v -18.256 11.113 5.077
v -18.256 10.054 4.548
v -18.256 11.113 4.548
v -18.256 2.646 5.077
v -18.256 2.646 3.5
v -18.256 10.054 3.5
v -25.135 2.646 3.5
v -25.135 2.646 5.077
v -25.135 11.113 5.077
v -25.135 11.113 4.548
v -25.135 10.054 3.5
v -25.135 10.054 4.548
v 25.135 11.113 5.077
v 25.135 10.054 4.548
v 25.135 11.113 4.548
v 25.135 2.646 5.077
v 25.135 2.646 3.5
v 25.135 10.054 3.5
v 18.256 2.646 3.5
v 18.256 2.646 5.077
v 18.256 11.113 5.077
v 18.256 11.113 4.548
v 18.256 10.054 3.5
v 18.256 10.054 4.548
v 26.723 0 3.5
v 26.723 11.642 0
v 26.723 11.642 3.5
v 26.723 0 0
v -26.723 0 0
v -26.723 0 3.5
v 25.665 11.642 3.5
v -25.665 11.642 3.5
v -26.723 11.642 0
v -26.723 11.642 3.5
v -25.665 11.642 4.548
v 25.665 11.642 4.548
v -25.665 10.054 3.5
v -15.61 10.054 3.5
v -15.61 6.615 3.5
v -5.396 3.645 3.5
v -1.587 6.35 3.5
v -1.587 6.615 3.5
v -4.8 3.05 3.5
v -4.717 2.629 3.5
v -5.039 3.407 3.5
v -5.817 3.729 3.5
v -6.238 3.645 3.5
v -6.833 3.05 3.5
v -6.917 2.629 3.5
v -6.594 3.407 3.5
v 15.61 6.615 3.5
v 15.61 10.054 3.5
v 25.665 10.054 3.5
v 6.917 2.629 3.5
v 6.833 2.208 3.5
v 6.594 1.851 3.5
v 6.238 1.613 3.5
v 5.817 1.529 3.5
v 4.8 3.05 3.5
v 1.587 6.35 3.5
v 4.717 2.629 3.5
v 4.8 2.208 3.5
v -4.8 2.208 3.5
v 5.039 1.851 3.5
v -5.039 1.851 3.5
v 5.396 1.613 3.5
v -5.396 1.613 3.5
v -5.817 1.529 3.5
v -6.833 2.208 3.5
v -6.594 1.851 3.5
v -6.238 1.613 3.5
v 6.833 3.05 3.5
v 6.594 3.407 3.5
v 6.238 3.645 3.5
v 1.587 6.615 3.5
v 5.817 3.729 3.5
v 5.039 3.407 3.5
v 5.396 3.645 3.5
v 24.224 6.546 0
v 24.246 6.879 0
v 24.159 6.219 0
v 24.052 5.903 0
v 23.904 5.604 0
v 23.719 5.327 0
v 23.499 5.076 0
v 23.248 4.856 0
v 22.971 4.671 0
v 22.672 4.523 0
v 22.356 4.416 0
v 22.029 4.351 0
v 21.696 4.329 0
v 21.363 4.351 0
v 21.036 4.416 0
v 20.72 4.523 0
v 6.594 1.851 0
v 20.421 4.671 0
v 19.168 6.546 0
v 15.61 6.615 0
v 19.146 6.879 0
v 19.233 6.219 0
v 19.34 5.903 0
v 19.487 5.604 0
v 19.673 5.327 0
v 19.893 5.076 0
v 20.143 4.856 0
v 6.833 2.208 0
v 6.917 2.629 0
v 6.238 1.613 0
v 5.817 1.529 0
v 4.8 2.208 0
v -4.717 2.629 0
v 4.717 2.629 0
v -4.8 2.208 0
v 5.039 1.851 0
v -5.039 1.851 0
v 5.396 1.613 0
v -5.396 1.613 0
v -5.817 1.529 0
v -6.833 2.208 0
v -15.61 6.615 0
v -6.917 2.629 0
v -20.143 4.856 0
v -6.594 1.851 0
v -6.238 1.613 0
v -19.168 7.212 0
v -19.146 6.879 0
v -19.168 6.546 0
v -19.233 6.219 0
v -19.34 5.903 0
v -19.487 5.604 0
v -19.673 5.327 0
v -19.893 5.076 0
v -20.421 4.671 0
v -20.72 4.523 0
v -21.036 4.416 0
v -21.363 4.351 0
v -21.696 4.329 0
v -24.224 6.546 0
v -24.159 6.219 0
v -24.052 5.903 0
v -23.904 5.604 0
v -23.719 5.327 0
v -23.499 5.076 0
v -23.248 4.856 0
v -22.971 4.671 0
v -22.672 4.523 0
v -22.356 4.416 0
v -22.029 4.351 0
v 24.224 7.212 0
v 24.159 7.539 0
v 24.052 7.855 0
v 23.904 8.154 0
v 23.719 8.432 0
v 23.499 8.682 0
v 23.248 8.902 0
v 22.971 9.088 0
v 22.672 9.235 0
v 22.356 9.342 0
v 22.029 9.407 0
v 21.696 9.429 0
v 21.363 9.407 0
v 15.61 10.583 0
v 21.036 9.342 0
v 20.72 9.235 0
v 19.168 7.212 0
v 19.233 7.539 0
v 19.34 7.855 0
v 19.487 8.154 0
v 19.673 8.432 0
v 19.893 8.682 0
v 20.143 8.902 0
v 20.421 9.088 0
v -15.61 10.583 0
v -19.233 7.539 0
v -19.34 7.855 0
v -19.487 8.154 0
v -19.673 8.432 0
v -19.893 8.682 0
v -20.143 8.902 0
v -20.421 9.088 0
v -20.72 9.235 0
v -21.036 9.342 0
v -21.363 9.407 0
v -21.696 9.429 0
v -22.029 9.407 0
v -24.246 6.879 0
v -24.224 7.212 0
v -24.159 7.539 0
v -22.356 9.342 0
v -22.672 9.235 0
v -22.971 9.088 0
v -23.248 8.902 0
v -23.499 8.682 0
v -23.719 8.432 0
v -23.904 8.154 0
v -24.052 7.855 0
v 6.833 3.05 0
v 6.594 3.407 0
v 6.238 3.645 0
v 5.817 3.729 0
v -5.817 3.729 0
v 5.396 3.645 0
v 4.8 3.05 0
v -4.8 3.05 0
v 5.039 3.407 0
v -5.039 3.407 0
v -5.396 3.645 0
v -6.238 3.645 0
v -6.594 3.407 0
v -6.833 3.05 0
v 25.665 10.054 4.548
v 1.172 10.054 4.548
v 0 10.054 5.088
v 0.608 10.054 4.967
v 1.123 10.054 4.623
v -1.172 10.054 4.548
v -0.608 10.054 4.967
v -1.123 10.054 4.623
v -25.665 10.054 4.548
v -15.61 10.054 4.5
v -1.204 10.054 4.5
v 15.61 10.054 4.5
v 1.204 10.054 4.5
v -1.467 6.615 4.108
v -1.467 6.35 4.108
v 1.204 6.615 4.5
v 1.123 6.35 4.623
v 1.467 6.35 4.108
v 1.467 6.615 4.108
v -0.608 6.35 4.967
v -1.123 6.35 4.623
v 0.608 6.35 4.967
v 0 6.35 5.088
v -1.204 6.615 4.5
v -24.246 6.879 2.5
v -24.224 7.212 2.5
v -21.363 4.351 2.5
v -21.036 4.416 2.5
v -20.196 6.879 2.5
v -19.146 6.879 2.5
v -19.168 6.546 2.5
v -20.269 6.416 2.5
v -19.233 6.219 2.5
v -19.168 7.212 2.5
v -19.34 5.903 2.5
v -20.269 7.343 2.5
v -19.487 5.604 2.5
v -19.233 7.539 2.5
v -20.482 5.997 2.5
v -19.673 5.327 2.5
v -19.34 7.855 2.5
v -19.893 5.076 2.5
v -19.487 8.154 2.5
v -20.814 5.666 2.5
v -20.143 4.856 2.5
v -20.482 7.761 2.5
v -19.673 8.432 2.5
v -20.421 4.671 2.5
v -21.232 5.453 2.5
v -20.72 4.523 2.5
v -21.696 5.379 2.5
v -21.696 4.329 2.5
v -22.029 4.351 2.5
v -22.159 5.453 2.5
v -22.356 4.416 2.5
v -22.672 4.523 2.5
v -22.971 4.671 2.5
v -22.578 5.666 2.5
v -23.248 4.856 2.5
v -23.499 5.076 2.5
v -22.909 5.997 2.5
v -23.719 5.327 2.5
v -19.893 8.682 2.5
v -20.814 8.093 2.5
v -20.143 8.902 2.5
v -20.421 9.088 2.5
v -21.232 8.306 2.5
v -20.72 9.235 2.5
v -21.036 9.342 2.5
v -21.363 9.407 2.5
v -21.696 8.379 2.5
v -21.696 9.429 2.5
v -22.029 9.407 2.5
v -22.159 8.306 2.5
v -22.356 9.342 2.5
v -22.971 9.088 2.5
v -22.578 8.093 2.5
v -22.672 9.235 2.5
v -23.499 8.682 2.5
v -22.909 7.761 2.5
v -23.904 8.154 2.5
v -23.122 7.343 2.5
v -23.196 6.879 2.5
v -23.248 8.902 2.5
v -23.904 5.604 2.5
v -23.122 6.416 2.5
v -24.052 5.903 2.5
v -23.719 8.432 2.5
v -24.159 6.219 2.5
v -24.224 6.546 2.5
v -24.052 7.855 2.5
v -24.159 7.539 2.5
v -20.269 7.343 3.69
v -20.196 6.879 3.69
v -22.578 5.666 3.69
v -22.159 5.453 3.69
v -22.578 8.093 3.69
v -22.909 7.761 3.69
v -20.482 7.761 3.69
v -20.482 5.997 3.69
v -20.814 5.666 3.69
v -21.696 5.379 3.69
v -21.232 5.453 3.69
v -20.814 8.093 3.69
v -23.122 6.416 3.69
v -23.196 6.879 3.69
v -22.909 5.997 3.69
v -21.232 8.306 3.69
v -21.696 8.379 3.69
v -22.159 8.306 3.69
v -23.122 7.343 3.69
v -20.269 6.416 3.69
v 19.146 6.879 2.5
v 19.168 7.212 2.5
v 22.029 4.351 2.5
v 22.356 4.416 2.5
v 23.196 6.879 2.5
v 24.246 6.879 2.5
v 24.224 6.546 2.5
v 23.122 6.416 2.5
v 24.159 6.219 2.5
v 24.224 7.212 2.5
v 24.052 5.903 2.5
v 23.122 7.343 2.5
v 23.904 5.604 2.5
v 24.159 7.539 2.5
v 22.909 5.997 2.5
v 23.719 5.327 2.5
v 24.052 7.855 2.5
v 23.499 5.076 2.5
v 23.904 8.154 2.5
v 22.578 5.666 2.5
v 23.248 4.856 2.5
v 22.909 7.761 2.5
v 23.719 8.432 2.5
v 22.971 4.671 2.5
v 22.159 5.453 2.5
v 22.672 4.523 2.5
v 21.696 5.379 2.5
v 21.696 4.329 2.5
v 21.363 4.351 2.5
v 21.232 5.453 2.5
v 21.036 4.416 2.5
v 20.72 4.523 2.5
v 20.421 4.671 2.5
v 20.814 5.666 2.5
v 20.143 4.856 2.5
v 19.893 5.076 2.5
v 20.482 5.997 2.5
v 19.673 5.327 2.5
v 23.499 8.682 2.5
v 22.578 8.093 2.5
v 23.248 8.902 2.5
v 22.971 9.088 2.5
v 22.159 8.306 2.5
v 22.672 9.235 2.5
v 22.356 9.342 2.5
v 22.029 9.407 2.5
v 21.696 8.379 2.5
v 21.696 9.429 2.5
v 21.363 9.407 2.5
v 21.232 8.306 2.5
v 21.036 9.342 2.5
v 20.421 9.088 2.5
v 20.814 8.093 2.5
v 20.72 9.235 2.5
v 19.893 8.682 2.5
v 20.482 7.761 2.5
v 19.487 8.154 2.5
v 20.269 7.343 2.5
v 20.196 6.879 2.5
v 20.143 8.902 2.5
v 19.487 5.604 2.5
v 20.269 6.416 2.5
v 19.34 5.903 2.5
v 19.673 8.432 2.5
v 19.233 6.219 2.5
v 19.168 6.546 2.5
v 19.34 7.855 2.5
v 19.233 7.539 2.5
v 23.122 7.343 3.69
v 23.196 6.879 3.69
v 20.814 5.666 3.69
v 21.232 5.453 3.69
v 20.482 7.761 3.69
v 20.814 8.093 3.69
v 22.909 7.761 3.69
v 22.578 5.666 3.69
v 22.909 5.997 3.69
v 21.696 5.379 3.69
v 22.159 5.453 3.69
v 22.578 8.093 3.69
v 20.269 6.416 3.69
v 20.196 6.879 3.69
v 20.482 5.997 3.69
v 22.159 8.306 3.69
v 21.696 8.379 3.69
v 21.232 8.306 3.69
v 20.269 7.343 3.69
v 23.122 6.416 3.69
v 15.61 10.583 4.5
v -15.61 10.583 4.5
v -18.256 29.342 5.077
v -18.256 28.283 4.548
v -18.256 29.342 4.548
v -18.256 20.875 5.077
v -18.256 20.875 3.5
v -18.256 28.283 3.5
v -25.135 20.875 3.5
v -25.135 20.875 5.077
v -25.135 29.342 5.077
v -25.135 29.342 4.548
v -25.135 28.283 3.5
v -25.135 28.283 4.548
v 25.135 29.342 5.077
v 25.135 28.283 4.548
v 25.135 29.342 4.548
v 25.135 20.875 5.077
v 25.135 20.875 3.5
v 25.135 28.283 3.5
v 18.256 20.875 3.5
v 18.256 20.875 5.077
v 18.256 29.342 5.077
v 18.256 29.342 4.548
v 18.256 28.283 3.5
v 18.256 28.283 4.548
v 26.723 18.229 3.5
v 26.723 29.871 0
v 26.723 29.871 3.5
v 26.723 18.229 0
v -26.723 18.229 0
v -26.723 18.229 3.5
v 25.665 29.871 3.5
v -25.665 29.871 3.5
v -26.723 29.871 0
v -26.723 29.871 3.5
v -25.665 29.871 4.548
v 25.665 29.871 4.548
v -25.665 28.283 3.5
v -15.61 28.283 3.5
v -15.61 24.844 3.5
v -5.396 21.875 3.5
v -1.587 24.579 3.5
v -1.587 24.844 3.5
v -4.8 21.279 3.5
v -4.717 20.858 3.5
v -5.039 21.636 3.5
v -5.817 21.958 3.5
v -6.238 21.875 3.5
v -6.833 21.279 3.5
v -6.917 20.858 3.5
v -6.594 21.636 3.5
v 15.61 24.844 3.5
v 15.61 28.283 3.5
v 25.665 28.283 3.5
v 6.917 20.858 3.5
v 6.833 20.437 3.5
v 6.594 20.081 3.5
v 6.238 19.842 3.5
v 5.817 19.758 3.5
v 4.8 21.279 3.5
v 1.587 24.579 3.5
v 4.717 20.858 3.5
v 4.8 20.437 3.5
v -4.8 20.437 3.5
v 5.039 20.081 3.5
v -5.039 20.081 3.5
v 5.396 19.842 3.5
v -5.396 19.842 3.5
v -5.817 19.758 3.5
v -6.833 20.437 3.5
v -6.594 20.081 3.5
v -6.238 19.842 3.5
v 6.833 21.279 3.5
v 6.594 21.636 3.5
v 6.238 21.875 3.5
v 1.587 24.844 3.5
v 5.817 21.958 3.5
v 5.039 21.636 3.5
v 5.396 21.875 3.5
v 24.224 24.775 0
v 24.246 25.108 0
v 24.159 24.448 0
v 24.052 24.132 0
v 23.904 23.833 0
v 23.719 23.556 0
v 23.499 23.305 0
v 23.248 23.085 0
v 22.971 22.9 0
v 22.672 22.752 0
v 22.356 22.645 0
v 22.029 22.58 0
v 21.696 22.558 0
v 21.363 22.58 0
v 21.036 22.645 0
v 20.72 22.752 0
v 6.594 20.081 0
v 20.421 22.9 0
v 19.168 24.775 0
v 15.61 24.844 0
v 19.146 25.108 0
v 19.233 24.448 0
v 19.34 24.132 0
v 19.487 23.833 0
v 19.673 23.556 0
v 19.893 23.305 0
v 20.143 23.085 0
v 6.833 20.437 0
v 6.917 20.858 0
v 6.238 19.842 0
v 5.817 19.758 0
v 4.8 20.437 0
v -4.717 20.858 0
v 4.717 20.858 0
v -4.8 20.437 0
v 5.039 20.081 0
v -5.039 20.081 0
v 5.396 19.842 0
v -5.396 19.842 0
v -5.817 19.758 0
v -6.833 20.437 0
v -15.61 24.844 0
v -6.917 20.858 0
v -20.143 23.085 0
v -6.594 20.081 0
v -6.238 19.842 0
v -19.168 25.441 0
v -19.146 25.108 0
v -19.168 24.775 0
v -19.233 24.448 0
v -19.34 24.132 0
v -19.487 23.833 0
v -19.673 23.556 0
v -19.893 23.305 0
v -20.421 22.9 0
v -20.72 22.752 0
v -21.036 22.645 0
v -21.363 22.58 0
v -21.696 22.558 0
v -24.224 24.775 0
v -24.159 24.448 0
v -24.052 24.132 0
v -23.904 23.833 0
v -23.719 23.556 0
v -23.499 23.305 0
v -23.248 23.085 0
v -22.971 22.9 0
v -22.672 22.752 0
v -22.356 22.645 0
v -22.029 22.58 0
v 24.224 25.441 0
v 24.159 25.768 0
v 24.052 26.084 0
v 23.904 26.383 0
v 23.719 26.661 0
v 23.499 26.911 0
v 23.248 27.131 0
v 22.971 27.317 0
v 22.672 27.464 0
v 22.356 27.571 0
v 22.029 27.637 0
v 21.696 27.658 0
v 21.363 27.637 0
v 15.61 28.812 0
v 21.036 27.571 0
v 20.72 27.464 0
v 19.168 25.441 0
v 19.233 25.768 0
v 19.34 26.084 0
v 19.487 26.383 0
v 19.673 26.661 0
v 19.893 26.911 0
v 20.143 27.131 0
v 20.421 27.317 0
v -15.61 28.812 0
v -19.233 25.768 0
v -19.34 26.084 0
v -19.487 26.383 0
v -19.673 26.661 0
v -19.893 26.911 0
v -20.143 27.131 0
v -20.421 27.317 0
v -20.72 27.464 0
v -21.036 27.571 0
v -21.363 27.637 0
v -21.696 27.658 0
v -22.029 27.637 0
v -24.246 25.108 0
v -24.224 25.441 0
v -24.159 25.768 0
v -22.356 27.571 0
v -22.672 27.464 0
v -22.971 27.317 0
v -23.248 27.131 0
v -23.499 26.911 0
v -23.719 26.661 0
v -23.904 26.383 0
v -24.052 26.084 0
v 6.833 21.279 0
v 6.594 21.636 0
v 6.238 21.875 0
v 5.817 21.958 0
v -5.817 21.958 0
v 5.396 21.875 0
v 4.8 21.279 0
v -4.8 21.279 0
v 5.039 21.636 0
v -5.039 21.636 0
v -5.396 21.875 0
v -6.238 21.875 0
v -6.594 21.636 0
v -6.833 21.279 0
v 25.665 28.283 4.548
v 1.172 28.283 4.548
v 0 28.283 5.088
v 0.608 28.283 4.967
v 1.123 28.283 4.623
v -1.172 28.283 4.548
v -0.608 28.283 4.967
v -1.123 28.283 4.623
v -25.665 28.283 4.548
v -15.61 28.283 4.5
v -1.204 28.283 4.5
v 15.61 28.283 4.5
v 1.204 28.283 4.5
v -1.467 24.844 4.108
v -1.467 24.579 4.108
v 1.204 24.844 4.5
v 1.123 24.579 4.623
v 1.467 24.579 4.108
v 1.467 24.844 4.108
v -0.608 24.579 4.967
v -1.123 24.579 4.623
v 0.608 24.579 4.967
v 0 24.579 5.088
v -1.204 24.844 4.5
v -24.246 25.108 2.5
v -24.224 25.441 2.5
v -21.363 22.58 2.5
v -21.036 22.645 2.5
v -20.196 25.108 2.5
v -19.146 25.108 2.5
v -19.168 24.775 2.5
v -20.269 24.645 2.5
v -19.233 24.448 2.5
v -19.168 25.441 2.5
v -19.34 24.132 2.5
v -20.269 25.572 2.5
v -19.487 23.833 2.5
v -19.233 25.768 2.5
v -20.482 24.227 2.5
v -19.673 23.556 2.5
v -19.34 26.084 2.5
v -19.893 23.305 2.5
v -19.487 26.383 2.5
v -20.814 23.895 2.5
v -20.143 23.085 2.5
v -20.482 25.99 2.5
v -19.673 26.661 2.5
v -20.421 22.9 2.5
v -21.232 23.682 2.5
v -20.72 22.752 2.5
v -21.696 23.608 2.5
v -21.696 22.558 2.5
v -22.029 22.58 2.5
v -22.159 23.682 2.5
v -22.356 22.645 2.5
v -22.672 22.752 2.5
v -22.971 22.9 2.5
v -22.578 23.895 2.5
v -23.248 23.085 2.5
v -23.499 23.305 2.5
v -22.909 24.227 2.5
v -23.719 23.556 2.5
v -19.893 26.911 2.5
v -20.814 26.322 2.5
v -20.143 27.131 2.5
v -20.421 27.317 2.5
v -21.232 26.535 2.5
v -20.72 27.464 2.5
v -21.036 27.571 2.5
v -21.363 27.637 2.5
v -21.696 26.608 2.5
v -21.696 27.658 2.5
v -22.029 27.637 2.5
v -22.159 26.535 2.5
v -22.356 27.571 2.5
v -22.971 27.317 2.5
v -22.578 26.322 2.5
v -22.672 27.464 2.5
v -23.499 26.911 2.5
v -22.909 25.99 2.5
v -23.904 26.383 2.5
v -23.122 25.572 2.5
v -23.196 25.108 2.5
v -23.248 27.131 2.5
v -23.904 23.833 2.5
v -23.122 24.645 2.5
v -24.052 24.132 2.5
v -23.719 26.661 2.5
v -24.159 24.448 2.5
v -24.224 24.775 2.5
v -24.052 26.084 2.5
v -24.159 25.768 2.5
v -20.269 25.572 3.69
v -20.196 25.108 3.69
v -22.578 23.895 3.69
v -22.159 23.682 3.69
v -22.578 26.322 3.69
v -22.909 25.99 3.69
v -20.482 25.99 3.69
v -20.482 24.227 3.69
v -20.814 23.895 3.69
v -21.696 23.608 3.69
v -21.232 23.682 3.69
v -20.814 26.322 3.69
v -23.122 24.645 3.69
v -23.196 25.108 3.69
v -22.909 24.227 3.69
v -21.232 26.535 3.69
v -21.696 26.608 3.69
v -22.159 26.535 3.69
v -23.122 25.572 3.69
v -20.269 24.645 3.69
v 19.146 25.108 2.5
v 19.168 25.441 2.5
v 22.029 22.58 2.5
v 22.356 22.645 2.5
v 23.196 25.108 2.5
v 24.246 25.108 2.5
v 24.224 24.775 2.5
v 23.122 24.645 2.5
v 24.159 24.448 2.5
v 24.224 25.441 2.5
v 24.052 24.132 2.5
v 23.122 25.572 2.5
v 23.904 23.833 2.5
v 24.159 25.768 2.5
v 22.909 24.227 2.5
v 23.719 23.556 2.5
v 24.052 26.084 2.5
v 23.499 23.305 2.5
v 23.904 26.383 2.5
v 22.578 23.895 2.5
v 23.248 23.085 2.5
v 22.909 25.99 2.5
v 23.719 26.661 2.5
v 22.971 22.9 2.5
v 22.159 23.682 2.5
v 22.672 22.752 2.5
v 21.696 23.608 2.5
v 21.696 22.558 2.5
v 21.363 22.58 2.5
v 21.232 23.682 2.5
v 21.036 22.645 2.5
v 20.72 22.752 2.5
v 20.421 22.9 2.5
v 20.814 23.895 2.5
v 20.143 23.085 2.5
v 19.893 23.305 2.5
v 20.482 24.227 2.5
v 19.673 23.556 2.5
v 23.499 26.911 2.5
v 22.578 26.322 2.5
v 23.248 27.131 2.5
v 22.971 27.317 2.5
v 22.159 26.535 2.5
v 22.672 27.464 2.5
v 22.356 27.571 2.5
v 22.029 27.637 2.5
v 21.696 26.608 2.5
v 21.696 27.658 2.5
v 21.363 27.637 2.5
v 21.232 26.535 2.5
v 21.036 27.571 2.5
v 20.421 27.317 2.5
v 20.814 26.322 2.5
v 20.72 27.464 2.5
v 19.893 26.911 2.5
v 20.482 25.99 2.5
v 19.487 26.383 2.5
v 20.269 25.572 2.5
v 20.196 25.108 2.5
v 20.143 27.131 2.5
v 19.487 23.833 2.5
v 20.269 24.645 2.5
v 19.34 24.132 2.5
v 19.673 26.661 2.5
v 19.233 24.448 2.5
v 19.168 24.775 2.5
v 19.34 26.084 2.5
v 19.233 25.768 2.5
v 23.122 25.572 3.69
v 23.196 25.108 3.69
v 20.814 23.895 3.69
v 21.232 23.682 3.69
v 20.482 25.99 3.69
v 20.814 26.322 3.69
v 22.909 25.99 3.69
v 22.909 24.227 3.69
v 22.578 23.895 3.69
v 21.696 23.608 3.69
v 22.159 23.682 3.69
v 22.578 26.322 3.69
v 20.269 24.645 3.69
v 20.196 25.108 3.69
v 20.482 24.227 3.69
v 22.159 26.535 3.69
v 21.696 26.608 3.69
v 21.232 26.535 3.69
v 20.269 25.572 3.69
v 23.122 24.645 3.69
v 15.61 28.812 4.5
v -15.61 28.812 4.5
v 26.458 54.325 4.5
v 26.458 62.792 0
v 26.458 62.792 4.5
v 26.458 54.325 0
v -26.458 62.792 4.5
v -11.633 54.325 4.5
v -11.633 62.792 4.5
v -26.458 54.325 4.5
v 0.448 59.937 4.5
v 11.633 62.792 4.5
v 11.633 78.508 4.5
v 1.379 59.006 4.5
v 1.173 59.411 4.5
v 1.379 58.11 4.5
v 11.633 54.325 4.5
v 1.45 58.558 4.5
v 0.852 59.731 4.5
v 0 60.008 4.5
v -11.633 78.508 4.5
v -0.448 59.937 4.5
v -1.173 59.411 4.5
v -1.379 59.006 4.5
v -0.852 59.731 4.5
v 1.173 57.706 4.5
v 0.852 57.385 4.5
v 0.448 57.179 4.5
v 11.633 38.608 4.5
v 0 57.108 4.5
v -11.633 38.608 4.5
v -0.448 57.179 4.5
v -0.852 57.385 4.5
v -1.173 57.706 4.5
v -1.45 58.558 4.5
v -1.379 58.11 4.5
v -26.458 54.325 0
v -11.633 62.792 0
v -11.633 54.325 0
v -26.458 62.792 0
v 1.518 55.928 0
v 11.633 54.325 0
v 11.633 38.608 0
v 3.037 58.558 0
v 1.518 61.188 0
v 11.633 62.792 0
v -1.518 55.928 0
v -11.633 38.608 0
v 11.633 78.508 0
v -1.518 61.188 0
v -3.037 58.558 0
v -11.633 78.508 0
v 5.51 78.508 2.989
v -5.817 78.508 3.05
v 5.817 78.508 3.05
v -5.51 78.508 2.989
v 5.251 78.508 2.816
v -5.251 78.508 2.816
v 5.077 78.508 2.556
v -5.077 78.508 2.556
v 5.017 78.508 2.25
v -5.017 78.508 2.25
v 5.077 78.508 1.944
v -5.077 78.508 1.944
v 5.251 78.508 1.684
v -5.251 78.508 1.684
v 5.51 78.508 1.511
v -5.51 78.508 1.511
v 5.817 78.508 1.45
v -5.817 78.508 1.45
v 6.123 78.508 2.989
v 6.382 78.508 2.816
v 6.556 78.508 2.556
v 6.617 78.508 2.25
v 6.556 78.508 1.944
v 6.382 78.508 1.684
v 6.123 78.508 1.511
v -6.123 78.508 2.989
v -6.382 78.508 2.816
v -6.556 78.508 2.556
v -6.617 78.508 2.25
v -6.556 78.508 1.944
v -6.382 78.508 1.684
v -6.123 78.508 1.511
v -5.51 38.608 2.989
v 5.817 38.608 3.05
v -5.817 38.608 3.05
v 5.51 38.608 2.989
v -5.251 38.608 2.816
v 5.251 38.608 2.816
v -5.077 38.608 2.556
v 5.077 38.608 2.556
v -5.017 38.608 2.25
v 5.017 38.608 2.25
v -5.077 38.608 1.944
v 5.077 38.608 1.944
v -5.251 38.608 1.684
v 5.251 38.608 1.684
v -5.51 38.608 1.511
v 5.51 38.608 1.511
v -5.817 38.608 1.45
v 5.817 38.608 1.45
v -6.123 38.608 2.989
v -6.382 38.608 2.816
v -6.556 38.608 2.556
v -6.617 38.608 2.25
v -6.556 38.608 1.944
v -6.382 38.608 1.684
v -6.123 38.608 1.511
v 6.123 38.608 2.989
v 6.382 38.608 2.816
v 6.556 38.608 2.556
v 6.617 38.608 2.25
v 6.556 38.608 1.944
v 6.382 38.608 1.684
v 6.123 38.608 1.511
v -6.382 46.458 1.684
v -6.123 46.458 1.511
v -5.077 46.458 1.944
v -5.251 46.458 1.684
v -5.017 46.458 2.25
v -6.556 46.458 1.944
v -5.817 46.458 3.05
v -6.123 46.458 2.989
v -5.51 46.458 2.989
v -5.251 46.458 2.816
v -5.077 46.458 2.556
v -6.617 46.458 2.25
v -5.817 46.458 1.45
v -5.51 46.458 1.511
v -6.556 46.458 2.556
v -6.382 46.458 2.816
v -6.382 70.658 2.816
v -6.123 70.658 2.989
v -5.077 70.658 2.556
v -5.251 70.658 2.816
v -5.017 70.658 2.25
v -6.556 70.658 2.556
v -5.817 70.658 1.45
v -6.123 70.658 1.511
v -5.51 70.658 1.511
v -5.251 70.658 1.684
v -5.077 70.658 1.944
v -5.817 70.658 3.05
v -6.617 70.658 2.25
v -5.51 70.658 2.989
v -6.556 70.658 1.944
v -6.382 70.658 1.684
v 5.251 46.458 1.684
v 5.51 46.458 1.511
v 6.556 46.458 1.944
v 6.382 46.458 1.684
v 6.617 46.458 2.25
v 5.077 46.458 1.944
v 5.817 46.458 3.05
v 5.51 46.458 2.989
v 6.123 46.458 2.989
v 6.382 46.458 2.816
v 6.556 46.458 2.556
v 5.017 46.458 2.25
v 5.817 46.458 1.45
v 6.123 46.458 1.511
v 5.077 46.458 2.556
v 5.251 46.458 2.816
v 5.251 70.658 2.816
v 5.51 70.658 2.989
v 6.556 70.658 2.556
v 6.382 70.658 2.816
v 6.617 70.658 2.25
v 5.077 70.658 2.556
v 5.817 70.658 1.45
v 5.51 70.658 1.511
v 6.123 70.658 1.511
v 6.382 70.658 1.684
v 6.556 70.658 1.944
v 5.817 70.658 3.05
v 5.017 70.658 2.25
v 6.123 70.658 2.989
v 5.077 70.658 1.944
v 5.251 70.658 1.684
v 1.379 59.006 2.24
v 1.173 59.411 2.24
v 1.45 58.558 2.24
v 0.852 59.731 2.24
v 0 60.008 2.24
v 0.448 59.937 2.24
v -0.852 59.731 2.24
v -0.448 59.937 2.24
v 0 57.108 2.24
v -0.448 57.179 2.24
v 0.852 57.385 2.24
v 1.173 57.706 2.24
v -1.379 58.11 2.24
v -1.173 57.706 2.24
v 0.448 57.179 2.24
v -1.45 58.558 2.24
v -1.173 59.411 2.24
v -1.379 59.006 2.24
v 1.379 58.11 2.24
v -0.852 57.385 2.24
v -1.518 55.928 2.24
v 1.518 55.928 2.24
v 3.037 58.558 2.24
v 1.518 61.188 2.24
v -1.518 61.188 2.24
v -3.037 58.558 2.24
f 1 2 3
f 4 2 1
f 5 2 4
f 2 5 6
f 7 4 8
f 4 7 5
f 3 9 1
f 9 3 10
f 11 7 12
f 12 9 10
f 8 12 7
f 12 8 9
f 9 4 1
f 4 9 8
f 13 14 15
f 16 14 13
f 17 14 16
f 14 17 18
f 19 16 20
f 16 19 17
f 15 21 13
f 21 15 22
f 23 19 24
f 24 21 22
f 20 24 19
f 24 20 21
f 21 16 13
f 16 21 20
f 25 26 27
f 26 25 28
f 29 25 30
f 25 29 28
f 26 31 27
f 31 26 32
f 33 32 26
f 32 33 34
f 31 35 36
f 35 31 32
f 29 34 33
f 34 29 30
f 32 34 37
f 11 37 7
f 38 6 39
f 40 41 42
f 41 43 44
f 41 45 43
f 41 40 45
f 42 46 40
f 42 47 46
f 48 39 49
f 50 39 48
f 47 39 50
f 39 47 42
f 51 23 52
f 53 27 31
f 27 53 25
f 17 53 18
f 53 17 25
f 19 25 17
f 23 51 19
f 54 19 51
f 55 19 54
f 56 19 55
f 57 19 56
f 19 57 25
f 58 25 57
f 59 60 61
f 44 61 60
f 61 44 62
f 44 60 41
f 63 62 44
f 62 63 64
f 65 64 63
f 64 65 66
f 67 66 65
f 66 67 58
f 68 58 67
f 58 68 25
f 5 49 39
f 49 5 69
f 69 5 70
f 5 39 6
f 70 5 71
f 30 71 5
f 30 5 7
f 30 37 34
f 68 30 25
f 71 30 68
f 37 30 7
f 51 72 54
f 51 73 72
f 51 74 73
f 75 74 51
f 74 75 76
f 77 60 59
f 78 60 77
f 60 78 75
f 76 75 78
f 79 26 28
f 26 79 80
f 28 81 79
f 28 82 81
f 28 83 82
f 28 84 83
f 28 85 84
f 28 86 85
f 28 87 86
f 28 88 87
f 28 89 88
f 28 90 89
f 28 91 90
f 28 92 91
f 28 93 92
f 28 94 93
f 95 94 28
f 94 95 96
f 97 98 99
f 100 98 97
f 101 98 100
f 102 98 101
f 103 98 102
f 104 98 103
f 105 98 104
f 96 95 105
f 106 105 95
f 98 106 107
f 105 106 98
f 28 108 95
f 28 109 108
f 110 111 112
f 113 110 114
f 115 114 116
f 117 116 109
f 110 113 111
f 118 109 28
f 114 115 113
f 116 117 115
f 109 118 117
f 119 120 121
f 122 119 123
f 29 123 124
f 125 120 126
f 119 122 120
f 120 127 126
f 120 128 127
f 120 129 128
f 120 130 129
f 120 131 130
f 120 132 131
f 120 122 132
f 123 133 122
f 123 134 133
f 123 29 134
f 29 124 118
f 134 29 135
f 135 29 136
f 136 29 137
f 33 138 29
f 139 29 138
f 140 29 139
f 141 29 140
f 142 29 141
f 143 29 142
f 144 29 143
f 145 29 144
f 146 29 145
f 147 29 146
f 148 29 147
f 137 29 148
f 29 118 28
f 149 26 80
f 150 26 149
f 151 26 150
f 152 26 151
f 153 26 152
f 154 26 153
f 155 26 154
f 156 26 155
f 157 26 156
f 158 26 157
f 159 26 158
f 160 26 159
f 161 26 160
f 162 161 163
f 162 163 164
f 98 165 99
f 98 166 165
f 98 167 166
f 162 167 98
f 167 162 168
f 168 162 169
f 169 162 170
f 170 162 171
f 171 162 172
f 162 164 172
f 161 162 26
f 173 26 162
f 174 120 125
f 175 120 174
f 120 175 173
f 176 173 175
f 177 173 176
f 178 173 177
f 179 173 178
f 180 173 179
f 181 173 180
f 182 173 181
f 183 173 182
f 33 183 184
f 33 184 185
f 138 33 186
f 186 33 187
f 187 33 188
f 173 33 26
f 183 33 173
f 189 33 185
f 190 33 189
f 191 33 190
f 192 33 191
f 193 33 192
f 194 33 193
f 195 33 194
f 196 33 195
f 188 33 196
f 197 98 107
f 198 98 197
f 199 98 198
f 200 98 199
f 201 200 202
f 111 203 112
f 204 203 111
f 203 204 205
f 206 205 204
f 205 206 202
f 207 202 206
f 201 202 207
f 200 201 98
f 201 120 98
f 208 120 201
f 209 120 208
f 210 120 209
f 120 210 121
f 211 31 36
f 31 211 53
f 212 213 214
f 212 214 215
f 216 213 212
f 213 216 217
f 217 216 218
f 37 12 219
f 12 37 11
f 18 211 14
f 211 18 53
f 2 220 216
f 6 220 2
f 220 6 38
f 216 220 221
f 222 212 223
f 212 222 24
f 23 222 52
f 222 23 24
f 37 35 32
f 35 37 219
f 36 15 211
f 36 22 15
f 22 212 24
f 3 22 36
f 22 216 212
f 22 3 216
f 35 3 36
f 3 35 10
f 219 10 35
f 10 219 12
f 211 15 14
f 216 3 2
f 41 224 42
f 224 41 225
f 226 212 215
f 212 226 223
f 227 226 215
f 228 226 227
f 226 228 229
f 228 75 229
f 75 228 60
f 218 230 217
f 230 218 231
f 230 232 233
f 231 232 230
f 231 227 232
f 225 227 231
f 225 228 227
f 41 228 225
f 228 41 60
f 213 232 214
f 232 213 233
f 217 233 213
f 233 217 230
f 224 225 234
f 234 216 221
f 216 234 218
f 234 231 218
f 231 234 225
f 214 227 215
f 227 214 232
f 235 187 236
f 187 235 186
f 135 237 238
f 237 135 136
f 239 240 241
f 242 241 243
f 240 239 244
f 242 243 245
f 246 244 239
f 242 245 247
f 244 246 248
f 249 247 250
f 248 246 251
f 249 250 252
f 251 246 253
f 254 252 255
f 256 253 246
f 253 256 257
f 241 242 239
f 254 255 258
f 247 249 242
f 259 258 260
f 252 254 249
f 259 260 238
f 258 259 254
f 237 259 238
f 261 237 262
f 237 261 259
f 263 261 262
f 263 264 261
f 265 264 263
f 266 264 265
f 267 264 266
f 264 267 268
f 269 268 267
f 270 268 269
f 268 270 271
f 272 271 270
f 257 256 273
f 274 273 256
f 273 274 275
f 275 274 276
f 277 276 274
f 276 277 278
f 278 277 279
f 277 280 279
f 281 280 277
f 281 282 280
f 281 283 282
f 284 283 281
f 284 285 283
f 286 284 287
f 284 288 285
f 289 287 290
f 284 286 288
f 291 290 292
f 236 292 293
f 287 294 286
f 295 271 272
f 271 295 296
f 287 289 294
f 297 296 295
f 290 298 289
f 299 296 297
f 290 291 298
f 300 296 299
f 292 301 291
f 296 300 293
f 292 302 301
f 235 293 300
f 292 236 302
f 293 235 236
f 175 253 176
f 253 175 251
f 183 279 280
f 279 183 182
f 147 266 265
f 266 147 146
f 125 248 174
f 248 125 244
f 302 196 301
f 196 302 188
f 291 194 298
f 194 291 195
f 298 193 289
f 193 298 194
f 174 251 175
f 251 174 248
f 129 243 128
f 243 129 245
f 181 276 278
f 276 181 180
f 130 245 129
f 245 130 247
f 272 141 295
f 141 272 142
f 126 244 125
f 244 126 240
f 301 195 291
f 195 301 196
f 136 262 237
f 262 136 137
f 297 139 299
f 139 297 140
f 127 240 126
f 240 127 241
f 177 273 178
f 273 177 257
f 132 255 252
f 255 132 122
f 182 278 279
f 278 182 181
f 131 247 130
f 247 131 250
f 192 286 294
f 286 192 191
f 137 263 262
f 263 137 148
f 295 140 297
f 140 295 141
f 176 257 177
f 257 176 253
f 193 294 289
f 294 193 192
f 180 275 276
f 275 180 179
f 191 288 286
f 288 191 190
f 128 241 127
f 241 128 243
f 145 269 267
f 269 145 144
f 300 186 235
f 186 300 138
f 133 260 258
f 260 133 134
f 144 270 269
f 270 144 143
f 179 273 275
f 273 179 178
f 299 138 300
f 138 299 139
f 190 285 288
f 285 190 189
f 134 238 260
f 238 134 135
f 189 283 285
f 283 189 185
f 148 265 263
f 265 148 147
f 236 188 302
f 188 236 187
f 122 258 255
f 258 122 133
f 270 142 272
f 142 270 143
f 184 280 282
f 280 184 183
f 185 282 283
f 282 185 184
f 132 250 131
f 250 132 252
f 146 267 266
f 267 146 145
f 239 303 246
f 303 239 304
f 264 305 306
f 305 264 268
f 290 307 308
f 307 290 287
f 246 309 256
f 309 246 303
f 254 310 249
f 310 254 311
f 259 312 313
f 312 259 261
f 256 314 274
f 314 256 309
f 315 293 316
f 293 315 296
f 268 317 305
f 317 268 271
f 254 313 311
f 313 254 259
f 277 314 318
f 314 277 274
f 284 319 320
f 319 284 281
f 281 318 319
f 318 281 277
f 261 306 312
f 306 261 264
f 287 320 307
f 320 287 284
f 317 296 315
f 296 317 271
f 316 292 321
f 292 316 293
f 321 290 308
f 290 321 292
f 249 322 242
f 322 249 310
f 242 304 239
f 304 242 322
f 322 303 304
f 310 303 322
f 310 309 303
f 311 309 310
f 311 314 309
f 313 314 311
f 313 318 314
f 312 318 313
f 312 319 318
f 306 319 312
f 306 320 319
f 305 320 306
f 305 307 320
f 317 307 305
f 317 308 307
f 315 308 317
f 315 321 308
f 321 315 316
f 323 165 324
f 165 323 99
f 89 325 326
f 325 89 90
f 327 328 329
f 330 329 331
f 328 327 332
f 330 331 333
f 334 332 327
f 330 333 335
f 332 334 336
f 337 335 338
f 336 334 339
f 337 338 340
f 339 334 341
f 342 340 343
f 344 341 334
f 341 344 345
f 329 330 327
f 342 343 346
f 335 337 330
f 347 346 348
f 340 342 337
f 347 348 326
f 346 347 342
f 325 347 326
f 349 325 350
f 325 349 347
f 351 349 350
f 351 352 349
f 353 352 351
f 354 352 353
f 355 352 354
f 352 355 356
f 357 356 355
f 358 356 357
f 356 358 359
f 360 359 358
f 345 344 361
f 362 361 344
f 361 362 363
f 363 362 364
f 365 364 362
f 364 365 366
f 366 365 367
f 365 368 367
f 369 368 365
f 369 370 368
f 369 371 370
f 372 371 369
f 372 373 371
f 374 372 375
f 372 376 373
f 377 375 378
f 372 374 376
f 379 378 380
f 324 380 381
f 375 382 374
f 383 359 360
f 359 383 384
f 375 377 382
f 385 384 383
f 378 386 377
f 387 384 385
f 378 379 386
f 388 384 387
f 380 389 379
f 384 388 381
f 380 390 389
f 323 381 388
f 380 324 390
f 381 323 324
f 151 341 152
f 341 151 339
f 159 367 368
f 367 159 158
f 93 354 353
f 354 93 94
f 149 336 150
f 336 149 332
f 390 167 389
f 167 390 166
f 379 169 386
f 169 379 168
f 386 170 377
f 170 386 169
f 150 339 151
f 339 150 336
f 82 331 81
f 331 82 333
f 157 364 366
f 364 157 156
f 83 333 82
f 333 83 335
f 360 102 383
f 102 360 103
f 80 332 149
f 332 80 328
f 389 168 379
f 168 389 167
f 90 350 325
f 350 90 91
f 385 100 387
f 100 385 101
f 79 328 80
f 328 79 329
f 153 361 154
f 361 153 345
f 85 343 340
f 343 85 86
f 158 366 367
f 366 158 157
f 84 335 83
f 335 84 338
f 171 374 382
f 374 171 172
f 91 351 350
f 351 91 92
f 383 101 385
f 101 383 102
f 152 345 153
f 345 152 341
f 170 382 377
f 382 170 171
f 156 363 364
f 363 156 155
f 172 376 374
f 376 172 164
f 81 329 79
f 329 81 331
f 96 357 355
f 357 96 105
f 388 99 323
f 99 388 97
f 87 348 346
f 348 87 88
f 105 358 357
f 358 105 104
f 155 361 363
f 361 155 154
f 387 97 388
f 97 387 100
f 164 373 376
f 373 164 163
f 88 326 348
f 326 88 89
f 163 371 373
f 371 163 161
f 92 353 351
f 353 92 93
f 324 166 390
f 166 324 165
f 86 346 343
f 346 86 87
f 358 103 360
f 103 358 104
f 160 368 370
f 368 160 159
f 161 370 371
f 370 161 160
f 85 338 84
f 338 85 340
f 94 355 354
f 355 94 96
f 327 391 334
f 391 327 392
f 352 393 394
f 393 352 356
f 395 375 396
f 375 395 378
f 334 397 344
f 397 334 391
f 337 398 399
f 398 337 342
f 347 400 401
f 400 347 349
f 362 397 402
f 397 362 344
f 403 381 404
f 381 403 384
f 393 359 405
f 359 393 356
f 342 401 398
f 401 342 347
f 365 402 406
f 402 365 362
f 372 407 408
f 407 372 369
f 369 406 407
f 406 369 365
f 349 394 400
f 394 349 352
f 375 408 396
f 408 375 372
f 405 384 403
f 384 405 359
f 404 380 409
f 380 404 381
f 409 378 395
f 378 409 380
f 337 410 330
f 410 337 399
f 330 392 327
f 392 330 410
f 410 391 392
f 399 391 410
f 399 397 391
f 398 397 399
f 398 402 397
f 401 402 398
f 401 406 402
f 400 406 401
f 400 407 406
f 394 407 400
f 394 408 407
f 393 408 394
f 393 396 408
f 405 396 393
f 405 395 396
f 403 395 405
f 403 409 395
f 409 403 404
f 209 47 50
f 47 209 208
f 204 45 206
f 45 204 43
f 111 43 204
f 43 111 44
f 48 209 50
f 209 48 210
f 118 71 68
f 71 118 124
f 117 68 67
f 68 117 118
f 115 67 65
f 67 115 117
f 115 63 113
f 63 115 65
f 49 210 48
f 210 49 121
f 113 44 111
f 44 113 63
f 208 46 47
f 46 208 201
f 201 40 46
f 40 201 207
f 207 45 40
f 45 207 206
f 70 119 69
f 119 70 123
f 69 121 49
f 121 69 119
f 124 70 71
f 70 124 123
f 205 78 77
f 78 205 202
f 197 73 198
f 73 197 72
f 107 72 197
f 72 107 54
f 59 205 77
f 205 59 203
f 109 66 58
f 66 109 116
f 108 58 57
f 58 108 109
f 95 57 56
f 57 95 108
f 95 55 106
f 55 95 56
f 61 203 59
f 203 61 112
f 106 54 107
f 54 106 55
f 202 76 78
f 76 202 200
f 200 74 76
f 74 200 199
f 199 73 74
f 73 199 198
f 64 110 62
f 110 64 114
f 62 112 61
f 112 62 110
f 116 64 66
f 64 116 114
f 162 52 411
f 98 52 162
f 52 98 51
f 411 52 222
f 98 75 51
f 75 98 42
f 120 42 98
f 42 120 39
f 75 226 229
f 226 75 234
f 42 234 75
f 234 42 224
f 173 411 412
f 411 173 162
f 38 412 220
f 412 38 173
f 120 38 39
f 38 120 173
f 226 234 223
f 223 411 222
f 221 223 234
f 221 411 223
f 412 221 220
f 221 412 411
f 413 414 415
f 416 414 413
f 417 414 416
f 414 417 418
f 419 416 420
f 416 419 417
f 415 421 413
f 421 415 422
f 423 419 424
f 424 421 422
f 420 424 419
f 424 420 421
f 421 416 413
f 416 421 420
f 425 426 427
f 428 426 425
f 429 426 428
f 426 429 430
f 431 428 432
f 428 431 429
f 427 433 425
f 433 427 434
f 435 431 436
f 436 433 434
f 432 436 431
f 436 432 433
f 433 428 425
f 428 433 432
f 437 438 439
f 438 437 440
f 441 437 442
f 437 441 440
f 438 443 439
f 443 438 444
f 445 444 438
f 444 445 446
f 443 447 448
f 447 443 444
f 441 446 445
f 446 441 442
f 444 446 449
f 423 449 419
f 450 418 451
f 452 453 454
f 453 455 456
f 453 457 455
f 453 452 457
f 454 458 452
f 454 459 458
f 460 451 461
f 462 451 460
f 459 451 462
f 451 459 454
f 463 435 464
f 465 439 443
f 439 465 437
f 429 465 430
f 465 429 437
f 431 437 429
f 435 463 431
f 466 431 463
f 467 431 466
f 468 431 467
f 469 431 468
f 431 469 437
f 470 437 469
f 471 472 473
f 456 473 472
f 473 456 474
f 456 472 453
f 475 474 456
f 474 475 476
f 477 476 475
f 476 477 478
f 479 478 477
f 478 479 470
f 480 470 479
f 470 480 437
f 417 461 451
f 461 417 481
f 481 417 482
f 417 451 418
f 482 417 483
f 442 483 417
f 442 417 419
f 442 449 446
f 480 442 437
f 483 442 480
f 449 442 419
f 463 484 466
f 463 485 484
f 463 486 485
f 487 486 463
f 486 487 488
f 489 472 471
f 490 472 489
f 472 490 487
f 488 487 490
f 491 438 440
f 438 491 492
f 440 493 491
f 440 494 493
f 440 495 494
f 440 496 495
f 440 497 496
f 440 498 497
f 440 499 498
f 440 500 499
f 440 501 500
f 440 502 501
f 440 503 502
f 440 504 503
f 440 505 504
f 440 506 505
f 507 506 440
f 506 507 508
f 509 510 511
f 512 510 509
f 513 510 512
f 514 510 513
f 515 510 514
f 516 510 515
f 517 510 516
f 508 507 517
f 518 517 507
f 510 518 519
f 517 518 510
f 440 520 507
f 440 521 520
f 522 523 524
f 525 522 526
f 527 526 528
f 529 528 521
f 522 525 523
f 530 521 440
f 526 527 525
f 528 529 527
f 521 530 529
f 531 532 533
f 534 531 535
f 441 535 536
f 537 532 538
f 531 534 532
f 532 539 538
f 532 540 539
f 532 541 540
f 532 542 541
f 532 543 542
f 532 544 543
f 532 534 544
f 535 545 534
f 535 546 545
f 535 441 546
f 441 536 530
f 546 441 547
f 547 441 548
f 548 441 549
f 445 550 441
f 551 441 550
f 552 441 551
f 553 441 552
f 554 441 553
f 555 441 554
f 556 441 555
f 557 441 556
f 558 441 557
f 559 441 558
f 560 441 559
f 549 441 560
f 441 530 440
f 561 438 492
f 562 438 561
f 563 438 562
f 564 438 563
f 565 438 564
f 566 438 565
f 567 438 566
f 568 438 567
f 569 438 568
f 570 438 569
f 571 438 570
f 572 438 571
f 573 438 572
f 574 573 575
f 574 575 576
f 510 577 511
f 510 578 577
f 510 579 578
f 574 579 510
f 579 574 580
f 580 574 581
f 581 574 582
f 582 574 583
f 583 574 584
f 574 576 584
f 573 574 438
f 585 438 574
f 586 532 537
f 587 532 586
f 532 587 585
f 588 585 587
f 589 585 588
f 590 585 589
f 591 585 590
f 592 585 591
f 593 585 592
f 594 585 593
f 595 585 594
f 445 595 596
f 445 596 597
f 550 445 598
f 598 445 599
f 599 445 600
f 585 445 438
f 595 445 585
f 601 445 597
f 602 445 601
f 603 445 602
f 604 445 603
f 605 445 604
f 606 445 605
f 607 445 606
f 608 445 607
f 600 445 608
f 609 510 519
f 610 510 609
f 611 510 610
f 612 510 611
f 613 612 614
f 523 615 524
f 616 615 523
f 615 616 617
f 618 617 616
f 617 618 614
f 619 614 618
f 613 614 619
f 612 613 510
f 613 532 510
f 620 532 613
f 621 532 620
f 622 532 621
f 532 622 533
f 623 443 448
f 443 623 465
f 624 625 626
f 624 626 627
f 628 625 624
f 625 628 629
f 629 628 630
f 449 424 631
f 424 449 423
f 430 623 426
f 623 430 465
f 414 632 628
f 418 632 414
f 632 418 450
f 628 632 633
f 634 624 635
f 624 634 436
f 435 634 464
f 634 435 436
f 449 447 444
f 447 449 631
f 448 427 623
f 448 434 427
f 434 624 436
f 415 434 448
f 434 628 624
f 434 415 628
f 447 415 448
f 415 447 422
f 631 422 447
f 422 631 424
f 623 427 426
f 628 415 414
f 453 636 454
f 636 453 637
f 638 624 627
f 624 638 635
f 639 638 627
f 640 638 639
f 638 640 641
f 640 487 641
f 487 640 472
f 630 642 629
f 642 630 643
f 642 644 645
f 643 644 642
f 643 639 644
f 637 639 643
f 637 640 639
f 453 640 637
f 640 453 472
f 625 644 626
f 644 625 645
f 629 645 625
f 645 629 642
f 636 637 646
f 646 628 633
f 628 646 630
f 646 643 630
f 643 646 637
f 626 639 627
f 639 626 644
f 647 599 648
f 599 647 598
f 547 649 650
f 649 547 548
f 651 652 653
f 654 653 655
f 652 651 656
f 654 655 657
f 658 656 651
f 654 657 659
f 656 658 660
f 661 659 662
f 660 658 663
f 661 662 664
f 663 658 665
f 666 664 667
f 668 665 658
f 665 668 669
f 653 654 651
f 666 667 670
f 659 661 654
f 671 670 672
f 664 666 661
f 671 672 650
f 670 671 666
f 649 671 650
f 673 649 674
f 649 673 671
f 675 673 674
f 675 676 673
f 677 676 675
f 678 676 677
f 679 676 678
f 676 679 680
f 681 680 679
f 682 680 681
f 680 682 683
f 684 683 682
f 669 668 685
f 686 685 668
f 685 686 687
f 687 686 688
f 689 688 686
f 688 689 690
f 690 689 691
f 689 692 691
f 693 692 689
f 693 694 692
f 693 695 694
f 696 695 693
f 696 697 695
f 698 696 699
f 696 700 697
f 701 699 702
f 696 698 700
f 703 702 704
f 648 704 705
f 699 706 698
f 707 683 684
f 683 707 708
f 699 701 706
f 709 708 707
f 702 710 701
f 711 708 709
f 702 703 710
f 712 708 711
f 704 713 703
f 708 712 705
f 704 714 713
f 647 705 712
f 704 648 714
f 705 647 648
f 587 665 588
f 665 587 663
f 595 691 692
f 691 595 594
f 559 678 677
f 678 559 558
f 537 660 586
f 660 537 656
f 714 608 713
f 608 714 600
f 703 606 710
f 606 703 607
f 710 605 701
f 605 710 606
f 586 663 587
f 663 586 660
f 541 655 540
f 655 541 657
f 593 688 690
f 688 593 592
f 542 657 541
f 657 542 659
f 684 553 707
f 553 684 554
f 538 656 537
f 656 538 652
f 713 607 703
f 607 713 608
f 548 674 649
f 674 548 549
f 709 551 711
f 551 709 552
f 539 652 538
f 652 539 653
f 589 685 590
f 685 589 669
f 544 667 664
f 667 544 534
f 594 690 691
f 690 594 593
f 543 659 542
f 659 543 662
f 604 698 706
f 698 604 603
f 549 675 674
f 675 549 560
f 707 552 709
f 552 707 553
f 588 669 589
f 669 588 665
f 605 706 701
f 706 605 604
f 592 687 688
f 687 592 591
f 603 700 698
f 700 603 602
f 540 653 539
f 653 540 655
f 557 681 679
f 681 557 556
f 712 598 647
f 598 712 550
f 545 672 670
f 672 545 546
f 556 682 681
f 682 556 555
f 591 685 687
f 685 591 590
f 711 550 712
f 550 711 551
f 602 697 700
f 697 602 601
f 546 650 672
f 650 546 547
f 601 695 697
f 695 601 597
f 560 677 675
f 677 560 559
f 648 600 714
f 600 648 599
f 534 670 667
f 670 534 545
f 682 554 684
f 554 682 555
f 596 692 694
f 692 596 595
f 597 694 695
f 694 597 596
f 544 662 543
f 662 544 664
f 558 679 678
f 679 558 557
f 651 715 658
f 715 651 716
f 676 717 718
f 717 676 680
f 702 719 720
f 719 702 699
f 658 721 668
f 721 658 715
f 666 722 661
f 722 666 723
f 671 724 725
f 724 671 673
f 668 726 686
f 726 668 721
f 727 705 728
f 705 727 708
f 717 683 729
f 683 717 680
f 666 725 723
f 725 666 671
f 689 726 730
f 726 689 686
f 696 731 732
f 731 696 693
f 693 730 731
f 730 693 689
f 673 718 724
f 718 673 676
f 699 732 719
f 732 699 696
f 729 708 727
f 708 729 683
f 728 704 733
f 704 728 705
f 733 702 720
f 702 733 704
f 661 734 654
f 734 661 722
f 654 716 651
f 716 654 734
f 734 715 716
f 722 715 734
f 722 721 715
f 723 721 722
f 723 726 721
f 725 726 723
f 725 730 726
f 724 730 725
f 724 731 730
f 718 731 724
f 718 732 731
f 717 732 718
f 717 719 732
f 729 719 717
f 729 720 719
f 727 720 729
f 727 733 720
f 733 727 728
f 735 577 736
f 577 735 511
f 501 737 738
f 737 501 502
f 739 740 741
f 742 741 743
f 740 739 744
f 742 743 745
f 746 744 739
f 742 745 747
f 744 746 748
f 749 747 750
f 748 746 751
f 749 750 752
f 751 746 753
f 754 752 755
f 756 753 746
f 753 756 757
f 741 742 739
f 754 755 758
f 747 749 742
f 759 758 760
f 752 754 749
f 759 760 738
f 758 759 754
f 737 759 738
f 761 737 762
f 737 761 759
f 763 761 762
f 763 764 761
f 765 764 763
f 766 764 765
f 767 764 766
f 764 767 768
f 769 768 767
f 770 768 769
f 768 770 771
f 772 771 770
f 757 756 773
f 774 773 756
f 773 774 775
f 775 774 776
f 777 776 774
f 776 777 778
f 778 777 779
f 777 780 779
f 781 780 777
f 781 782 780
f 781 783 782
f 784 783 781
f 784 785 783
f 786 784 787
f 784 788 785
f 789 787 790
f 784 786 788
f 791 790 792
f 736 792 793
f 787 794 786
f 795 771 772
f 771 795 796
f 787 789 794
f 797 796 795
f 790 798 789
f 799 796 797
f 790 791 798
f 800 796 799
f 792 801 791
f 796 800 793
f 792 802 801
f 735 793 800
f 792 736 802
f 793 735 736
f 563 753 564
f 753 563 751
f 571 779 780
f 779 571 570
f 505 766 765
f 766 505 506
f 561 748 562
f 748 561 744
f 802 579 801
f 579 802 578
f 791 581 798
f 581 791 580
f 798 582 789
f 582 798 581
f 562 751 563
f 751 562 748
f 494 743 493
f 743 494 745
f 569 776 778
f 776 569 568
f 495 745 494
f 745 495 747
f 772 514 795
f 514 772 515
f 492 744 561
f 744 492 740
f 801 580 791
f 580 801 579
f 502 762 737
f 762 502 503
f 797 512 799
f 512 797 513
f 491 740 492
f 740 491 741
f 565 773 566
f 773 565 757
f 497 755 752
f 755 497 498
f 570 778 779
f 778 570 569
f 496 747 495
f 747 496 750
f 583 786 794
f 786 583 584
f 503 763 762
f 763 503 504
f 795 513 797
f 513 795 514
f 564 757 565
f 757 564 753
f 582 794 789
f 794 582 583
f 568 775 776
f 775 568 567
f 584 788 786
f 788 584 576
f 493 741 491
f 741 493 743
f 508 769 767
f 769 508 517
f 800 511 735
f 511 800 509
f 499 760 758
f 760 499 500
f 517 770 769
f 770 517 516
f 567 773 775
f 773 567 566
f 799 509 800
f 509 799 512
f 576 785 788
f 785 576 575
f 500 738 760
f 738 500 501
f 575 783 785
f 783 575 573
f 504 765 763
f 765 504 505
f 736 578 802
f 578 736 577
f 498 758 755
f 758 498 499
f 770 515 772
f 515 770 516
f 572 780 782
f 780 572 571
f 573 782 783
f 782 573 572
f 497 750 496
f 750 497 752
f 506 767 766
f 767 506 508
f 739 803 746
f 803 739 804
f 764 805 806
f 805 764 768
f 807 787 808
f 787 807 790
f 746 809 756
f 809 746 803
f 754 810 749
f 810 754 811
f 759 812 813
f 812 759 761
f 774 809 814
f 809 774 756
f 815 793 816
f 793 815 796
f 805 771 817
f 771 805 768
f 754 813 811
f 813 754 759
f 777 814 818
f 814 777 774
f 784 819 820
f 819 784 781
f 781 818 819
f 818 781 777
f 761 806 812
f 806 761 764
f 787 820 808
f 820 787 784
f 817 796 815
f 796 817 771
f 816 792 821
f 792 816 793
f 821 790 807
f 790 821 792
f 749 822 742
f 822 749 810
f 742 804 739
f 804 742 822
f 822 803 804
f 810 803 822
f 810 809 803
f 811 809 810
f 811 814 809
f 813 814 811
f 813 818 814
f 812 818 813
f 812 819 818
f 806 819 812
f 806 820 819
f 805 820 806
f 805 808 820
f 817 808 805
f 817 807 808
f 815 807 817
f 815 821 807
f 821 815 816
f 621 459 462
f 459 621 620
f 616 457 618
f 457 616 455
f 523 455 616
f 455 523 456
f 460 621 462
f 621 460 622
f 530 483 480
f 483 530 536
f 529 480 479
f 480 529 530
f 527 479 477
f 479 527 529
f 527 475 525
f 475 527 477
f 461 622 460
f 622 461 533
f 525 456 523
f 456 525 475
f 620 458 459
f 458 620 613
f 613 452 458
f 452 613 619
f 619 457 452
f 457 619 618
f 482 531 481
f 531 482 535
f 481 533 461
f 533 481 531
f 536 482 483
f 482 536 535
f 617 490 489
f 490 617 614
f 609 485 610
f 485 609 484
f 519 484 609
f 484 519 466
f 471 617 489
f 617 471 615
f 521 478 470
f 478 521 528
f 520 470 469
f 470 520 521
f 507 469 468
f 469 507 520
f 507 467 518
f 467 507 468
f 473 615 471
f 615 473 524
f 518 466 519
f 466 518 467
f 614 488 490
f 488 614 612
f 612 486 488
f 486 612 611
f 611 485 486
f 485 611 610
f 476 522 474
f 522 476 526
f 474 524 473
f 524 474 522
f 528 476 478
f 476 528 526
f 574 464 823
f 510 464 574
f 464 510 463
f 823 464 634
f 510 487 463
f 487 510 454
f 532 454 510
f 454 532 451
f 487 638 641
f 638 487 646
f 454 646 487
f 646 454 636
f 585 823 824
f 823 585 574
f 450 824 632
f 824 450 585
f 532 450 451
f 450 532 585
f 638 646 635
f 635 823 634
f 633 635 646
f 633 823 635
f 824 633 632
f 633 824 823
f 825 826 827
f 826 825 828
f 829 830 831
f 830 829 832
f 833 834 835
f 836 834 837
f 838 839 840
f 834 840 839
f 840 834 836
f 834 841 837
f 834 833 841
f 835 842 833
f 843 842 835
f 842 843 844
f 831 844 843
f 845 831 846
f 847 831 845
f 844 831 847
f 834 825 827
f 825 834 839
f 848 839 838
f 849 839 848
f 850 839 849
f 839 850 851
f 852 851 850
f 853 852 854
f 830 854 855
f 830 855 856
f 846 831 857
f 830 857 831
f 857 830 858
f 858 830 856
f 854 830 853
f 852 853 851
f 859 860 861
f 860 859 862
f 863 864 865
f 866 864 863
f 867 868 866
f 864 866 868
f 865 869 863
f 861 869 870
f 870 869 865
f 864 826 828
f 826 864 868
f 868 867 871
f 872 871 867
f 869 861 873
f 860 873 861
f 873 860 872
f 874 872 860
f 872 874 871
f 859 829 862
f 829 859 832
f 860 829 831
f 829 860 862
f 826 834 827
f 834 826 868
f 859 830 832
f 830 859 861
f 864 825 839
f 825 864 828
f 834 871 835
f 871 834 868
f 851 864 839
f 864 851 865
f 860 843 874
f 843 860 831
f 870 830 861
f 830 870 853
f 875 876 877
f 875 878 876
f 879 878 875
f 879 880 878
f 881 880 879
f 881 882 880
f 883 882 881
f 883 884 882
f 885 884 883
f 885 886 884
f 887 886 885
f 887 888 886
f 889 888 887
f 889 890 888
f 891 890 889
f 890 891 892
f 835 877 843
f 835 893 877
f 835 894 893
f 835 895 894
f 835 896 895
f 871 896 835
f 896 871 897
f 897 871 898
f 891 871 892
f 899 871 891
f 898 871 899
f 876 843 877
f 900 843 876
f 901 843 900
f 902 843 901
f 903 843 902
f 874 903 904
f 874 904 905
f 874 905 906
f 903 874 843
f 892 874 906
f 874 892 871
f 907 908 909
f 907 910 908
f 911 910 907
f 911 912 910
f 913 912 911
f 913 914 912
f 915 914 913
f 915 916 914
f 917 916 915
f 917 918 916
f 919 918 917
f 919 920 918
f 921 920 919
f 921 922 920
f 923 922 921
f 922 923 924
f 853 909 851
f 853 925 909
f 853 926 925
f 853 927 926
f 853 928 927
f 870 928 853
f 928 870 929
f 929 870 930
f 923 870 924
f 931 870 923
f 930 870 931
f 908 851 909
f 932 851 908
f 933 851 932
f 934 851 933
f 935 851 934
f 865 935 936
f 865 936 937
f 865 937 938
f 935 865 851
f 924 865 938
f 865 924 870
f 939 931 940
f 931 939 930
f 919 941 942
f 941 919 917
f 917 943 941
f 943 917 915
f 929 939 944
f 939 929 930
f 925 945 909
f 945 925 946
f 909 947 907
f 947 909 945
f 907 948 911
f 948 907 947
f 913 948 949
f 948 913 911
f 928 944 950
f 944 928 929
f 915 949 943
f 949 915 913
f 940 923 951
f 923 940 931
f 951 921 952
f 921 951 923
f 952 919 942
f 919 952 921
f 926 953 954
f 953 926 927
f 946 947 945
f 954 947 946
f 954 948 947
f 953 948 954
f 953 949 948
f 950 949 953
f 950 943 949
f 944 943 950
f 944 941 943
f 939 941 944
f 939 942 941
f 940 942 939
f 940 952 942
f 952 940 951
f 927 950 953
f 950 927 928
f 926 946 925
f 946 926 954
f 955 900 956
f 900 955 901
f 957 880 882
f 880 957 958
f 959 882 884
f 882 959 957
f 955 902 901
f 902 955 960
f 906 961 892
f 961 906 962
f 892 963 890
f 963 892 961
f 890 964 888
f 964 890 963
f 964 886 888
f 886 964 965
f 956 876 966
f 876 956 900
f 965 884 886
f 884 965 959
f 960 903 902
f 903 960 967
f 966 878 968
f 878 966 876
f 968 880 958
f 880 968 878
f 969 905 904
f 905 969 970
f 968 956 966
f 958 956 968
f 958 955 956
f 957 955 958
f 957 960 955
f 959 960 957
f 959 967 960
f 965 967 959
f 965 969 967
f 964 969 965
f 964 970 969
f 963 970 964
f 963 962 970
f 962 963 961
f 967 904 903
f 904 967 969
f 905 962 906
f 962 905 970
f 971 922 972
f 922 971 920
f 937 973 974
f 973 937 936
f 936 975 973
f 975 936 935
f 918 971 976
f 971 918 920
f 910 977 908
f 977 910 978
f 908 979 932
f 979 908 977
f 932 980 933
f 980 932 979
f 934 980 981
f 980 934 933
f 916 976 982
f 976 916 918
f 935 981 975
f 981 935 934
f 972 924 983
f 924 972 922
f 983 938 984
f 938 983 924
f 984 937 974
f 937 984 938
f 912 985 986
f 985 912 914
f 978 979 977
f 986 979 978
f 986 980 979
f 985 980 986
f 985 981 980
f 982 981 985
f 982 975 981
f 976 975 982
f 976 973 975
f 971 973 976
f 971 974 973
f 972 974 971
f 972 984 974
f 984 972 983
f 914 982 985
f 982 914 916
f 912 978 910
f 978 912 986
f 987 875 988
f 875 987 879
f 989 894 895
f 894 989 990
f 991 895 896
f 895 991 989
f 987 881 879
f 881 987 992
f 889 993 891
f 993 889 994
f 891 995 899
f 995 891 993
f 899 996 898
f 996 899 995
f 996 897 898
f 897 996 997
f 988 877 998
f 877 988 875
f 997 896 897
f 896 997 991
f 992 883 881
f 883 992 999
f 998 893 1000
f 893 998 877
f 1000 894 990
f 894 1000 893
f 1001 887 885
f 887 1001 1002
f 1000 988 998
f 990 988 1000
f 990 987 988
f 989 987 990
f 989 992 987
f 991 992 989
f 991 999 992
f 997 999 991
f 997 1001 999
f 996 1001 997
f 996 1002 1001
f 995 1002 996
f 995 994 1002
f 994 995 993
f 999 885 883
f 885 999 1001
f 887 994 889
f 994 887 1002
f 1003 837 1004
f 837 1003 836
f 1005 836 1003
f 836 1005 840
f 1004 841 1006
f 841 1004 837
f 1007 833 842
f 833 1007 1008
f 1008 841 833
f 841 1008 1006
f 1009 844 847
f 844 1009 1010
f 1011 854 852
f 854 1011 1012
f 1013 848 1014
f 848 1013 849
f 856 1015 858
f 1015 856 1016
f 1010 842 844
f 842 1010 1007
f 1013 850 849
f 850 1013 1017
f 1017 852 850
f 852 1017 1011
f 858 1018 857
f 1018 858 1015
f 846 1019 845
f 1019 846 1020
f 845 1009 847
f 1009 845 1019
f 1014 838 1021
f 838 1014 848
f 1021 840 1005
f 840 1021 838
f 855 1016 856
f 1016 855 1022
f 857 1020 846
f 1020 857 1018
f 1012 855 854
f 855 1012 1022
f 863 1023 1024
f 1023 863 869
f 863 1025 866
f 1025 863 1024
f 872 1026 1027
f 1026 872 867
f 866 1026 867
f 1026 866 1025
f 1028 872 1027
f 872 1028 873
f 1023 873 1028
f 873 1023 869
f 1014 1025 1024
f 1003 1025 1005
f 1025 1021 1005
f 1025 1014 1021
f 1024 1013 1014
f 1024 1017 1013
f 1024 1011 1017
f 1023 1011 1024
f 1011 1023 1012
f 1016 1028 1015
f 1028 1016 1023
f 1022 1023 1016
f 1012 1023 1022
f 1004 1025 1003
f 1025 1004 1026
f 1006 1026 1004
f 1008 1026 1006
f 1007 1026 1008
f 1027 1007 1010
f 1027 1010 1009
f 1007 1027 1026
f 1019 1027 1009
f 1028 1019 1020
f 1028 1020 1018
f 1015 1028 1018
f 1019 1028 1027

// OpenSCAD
// Milwaukee Road Little Joe, O scale 1-48 - print 14 of 17: truck_guide - 2-axle guide truck - print 2
// Render (F6), export STL, print. Settings: ../../library/lj_params.scad
// Whole loco preview and notes: ../../MILW_LittleJoe_Main.scad
SCALE_SEL = "O";
LOCO_SEL = "E70";   // [E20, E21, E70, E71, E72, E73, E74, E75, E76, E77, E78, E79] the body and roof change for E20 / E21
include <../../library/lj_all.scad>
lj_plate("truck_guide");
